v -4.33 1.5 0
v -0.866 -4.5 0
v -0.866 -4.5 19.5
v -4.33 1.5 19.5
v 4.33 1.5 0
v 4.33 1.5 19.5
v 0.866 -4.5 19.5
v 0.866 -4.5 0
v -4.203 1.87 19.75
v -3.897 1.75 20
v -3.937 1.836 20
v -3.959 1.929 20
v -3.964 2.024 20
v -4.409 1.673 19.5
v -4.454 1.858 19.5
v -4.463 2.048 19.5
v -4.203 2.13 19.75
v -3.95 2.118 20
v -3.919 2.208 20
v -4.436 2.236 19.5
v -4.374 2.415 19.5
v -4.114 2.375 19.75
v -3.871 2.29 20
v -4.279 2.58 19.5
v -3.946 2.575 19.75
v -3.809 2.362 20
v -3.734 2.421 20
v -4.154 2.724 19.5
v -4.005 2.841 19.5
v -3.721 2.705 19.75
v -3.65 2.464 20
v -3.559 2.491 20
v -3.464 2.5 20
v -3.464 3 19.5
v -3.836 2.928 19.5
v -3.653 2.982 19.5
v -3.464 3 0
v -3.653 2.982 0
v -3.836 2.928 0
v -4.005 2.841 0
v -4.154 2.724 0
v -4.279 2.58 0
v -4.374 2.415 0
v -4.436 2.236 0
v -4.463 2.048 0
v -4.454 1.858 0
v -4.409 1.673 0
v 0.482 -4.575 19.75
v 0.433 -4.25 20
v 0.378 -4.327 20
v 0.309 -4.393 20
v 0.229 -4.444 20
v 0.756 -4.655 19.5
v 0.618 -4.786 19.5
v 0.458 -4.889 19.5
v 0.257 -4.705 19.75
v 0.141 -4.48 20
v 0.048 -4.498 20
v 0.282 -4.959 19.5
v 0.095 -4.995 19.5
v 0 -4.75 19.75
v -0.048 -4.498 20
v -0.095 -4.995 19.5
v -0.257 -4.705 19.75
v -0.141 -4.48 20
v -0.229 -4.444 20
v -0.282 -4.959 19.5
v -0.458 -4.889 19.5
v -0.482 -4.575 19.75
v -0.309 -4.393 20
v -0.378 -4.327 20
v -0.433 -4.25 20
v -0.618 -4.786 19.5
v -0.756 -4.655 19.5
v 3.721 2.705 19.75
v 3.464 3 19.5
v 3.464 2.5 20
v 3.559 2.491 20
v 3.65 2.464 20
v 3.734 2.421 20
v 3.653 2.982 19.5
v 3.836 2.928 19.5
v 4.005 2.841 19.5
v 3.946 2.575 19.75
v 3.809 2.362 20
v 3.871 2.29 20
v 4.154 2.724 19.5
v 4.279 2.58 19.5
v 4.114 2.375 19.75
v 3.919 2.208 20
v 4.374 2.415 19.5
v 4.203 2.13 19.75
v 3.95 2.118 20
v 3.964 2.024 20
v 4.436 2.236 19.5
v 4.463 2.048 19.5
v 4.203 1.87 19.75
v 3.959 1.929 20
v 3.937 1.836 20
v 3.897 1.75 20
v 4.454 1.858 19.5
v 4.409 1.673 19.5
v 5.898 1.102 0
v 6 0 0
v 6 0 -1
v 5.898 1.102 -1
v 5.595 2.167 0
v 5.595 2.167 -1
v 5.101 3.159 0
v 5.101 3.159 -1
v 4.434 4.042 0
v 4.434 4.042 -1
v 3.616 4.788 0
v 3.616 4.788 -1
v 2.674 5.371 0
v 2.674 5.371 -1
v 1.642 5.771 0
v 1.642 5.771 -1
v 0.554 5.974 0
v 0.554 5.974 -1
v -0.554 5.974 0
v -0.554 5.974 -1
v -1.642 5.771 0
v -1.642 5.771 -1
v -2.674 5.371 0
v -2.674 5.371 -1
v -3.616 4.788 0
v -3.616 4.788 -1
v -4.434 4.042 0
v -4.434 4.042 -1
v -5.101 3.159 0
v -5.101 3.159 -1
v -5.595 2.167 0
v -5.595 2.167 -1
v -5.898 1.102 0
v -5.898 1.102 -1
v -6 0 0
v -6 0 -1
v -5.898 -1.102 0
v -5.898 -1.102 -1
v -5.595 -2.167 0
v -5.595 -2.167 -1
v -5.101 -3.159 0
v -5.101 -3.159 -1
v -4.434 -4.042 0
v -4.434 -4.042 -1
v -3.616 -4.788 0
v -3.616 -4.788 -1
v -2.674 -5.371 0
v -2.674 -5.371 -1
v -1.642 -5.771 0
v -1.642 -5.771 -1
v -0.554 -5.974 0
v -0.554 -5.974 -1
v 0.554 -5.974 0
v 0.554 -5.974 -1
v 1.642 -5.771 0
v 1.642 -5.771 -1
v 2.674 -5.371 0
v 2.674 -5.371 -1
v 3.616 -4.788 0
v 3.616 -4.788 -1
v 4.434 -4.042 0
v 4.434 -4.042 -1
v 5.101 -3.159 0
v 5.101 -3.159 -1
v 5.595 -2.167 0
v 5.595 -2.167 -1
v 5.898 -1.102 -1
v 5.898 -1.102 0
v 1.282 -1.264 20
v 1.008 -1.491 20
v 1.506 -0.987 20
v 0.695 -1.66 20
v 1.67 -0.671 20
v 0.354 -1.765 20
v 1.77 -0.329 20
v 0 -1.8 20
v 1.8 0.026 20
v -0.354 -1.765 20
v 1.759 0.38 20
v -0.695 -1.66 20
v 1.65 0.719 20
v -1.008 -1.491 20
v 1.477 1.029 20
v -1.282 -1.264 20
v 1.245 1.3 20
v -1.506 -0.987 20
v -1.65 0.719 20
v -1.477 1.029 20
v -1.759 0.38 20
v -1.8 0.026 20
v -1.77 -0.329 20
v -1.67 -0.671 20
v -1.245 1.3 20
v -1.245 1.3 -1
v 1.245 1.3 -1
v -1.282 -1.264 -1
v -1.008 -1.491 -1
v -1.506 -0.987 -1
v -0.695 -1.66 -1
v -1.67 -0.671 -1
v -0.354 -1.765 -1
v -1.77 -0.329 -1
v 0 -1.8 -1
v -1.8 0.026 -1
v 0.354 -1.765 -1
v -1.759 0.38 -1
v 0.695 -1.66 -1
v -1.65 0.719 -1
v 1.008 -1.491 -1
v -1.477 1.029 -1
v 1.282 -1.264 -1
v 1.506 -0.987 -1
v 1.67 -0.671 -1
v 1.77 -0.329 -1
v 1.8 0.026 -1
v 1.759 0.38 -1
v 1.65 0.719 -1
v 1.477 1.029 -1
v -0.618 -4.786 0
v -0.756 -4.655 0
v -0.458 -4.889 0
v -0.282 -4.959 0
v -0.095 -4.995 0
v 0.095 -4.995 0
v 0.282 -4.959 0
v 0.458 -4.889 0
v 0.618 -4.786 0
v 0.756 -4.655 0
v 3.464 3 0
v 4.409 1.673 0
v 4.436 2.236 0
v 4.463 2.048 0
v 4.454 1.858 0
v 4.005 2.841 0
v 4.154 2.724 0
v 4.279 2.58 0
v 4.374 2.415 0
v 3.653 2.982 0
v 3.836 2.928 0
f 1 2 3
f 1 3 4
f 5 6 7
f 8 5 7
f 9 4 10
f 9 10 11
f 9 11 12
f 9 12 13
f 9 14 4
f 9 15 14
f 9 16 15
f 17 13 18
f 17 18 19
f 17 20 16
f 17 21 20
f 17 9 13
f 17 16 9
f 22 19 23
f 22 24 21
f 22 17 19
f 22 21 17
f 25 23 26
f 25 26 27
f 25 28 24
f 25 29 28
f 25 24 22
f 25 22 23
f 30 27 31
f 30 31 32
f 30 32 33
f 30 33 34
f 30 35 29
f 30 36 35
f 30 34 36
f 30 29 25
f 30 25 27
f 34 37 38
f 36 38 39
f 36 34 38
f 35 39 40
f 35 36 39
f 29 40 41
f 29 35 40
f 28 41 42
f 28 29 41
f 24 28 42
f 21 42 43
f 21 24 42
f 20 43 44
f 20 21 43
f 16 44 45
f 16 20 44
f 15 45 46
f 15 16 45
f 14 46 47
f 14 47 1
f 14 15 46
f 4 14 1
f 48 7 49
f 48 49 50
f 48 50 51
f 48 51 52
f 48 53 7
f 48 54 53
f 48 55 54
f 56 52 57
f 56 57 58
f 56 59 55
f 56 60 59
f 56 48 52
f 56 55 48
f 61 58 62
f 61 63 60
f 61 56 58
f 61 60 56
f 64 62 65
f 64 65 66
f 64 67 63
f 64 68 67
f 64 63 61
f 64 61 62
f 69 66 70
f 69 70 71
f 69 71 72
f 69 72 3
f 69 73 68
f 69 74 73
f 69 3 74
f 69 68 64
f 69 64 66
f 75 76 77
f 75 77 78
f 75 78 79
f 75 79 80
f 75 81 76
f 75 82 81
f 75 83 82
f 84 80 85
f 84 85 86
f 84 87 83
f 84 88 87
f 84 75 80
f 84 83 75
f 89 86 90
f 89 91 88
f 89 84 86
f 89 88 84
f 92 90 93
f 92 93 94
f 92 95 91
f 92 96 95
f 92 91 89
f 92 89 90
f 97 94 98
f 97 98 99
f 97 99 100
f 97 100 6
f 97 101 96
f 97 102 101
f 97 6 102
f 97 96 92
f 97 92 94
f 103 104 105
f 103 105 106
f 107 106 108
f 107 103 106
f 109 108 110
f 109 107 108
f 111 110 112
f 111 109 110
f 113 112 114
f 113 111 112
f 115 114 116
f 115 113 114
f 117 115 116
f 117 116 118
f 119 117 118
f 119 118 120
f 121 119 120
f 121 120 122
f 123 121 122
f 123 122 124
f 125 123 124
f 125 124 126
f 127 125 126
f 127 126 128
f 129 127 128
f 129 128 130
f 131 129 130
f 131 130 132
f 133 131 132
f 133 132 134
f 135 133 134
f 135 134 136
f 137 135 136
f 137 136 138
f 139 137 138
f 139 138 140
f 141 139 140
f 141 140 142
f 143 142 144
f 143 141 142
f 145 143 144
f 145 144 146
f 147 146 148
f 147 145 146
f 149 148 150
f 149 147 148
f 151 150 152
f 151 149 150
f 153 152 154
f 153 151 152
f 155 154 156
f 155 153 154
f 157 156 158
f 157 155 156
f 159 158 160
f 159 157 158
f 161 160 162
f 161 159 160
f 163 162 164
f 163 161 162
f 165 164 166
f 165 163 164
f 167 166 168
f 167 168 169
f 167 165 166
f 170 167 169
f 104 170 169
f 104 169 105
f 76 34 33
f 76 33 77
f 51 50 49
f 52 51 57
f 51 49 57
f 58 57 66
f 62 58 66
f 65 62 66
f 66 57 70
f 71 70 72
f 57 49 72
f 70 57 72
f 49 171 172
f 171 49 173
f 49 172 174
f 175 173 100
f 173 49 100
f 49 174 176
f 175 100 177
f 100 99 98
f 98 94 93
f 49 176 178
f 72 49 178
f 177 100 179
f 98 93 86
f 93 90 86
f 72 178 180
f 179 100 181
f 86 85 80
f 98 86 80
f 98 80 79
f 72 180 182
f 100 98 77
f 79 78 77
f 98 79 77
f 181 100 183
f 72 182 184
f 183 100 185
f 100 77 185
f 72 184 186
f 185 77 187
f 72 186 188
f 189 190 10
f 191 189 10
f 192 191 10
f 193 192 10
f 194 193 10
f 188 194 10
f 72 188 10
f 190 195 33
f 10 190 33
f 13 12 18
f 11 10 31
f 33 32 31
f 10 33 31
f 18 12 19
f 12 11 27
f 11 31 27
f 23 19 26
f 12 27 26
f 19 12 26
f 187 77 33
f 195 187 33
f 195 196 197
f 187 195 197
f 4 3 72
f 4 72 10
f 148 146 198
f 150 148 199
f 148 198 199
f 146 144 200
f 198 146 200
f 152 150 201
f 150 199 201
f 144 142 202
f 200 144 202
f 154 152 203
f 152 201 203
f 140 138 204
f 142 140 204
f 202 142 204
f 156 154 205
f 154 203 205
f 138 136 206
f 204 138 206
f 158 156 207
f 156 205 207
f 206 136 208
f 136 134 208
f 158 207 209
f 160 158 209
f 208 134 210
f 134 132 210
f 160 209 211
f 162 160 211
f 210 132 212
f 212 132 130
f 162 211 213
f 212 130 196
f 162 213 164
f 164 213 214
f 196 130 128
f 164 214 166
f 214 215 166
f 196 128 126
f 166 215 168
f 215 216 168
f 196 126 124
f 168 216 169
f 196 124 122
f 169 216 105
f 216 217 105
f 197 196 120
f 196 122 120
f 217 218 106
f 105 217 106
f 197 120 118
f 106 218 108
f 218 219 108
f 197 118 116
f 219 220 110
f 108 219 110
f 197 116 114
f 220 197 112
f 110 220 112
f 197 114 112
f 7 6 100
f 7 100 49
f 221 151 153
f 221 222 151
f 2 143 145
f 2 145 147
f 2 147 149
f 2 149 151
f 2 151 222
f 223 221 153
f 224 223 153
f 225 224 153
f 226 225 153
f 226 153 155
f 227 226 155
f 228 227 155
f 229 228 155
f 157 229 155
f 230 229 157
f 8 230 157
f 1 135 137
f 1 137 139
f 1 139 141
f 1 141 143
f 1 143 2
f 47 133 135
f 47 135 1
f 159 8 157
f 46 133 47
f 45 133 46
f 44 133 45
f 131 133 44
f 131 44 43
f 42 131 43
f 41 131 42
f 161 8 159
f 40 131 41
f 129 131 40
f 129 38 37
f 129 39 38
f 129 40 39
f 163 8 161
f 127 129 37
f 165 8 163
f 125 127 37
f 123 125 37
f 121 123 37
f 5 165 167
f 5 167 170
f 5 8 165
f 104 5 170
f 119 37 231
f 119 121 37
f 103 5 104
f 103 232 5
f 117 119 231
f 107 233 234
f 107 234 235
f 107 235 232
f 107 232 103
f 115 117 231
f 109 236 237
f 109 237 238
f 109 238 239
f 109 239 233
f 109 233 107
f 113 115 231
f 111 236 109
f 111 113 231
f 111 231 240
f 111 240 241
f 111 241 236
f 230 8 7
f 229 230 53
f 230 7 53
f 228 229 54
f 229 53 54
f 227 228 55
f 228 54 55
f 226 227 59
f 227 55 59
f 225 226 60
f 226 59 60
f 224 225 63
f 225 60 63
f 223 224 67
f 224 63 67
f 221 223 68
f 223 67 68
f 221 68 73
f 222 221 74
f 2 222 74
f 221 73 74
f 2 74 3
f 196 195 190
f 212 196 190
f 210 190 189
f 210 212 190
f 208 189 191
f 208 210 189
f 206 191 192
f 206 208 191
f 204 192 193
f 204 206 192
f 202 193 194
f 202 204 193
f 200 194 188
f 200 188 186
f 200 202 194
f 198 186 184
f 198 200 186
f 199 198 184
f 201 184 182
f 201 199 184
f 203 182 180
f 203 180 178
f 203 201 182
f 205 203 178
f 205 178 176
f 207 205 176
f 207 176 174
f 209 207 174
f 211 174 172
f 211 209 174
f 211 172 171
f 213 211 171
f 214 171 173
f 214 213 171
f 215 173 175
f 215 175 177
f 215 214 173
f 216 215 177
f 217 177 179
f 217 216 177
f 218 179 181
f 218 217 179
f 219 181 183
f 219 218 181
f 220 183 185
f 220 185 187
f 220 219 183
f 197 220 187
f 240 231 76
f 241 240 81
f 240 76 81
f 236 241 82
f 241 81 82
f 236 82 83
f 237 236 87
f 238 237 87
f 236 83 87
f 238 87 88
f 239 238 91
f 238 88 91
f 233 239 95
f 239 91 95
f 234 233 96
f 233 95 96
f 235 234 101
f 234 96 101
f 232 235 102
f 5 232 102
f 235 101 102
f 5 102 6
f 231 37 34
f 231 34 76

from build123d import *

# Parameters (mm, degrees)
SKETCH_R     = 6
PAD_DEPTH    = 1
PAD001_DEPTH = 20
FILLET_R     = 1
CHAMFER_SIZE = 0.5


with BuildPart() as part:
    # Sketch → Pad (new body)
    with BuildSketch(Plane.XY):
        Circle(SKETCH_R)
        with BuildLine():
            ThreePointArc((-1.24499, 1.3), (0, -1.8), (1.24499, 1.3))
            Line((-1.24499, 1.3), (1.24499, 1.3))
        make_face(mode=Mode.SUBTRACT)
    extrude(amount=-PAD_DEPTH)

    # Sketch001 → Pad001 (join)
    with BuildSketch(Plane.XY):
        Polygon((-5.196152, 3), (5.196152, 3), (0, -6), align=None)
        with BuildLine():
            ThreePointArc((-1.24499, 1.3), (0, -1.8), (1.24499, 1.3))
            Line((-1.24499, 1.3), (1.24499, 1.3))
        make_face(mode=Mode.SUBTRACT)
    extrude(amount=PAD001_DEPTH)

    # Fillet
    fillet_edges = [part.edges().sort_by_distance(p)[0] for p in [
        (0, -6, 10),
        (5.196152, 3, 10),
        (-5.196152, 3, 10),
    ]]
    fillet(fillet_edges, radius=FILLET_R)

    # Chamfer
    chamfer_edges = [part.edges().sort_by_distance(p)[0] for p in [
        (-2.598076, -1.5, 20),
    ]]
    chamfer(chamfer_edges, length=CHAMFER_SIZE)


solid = part.part
